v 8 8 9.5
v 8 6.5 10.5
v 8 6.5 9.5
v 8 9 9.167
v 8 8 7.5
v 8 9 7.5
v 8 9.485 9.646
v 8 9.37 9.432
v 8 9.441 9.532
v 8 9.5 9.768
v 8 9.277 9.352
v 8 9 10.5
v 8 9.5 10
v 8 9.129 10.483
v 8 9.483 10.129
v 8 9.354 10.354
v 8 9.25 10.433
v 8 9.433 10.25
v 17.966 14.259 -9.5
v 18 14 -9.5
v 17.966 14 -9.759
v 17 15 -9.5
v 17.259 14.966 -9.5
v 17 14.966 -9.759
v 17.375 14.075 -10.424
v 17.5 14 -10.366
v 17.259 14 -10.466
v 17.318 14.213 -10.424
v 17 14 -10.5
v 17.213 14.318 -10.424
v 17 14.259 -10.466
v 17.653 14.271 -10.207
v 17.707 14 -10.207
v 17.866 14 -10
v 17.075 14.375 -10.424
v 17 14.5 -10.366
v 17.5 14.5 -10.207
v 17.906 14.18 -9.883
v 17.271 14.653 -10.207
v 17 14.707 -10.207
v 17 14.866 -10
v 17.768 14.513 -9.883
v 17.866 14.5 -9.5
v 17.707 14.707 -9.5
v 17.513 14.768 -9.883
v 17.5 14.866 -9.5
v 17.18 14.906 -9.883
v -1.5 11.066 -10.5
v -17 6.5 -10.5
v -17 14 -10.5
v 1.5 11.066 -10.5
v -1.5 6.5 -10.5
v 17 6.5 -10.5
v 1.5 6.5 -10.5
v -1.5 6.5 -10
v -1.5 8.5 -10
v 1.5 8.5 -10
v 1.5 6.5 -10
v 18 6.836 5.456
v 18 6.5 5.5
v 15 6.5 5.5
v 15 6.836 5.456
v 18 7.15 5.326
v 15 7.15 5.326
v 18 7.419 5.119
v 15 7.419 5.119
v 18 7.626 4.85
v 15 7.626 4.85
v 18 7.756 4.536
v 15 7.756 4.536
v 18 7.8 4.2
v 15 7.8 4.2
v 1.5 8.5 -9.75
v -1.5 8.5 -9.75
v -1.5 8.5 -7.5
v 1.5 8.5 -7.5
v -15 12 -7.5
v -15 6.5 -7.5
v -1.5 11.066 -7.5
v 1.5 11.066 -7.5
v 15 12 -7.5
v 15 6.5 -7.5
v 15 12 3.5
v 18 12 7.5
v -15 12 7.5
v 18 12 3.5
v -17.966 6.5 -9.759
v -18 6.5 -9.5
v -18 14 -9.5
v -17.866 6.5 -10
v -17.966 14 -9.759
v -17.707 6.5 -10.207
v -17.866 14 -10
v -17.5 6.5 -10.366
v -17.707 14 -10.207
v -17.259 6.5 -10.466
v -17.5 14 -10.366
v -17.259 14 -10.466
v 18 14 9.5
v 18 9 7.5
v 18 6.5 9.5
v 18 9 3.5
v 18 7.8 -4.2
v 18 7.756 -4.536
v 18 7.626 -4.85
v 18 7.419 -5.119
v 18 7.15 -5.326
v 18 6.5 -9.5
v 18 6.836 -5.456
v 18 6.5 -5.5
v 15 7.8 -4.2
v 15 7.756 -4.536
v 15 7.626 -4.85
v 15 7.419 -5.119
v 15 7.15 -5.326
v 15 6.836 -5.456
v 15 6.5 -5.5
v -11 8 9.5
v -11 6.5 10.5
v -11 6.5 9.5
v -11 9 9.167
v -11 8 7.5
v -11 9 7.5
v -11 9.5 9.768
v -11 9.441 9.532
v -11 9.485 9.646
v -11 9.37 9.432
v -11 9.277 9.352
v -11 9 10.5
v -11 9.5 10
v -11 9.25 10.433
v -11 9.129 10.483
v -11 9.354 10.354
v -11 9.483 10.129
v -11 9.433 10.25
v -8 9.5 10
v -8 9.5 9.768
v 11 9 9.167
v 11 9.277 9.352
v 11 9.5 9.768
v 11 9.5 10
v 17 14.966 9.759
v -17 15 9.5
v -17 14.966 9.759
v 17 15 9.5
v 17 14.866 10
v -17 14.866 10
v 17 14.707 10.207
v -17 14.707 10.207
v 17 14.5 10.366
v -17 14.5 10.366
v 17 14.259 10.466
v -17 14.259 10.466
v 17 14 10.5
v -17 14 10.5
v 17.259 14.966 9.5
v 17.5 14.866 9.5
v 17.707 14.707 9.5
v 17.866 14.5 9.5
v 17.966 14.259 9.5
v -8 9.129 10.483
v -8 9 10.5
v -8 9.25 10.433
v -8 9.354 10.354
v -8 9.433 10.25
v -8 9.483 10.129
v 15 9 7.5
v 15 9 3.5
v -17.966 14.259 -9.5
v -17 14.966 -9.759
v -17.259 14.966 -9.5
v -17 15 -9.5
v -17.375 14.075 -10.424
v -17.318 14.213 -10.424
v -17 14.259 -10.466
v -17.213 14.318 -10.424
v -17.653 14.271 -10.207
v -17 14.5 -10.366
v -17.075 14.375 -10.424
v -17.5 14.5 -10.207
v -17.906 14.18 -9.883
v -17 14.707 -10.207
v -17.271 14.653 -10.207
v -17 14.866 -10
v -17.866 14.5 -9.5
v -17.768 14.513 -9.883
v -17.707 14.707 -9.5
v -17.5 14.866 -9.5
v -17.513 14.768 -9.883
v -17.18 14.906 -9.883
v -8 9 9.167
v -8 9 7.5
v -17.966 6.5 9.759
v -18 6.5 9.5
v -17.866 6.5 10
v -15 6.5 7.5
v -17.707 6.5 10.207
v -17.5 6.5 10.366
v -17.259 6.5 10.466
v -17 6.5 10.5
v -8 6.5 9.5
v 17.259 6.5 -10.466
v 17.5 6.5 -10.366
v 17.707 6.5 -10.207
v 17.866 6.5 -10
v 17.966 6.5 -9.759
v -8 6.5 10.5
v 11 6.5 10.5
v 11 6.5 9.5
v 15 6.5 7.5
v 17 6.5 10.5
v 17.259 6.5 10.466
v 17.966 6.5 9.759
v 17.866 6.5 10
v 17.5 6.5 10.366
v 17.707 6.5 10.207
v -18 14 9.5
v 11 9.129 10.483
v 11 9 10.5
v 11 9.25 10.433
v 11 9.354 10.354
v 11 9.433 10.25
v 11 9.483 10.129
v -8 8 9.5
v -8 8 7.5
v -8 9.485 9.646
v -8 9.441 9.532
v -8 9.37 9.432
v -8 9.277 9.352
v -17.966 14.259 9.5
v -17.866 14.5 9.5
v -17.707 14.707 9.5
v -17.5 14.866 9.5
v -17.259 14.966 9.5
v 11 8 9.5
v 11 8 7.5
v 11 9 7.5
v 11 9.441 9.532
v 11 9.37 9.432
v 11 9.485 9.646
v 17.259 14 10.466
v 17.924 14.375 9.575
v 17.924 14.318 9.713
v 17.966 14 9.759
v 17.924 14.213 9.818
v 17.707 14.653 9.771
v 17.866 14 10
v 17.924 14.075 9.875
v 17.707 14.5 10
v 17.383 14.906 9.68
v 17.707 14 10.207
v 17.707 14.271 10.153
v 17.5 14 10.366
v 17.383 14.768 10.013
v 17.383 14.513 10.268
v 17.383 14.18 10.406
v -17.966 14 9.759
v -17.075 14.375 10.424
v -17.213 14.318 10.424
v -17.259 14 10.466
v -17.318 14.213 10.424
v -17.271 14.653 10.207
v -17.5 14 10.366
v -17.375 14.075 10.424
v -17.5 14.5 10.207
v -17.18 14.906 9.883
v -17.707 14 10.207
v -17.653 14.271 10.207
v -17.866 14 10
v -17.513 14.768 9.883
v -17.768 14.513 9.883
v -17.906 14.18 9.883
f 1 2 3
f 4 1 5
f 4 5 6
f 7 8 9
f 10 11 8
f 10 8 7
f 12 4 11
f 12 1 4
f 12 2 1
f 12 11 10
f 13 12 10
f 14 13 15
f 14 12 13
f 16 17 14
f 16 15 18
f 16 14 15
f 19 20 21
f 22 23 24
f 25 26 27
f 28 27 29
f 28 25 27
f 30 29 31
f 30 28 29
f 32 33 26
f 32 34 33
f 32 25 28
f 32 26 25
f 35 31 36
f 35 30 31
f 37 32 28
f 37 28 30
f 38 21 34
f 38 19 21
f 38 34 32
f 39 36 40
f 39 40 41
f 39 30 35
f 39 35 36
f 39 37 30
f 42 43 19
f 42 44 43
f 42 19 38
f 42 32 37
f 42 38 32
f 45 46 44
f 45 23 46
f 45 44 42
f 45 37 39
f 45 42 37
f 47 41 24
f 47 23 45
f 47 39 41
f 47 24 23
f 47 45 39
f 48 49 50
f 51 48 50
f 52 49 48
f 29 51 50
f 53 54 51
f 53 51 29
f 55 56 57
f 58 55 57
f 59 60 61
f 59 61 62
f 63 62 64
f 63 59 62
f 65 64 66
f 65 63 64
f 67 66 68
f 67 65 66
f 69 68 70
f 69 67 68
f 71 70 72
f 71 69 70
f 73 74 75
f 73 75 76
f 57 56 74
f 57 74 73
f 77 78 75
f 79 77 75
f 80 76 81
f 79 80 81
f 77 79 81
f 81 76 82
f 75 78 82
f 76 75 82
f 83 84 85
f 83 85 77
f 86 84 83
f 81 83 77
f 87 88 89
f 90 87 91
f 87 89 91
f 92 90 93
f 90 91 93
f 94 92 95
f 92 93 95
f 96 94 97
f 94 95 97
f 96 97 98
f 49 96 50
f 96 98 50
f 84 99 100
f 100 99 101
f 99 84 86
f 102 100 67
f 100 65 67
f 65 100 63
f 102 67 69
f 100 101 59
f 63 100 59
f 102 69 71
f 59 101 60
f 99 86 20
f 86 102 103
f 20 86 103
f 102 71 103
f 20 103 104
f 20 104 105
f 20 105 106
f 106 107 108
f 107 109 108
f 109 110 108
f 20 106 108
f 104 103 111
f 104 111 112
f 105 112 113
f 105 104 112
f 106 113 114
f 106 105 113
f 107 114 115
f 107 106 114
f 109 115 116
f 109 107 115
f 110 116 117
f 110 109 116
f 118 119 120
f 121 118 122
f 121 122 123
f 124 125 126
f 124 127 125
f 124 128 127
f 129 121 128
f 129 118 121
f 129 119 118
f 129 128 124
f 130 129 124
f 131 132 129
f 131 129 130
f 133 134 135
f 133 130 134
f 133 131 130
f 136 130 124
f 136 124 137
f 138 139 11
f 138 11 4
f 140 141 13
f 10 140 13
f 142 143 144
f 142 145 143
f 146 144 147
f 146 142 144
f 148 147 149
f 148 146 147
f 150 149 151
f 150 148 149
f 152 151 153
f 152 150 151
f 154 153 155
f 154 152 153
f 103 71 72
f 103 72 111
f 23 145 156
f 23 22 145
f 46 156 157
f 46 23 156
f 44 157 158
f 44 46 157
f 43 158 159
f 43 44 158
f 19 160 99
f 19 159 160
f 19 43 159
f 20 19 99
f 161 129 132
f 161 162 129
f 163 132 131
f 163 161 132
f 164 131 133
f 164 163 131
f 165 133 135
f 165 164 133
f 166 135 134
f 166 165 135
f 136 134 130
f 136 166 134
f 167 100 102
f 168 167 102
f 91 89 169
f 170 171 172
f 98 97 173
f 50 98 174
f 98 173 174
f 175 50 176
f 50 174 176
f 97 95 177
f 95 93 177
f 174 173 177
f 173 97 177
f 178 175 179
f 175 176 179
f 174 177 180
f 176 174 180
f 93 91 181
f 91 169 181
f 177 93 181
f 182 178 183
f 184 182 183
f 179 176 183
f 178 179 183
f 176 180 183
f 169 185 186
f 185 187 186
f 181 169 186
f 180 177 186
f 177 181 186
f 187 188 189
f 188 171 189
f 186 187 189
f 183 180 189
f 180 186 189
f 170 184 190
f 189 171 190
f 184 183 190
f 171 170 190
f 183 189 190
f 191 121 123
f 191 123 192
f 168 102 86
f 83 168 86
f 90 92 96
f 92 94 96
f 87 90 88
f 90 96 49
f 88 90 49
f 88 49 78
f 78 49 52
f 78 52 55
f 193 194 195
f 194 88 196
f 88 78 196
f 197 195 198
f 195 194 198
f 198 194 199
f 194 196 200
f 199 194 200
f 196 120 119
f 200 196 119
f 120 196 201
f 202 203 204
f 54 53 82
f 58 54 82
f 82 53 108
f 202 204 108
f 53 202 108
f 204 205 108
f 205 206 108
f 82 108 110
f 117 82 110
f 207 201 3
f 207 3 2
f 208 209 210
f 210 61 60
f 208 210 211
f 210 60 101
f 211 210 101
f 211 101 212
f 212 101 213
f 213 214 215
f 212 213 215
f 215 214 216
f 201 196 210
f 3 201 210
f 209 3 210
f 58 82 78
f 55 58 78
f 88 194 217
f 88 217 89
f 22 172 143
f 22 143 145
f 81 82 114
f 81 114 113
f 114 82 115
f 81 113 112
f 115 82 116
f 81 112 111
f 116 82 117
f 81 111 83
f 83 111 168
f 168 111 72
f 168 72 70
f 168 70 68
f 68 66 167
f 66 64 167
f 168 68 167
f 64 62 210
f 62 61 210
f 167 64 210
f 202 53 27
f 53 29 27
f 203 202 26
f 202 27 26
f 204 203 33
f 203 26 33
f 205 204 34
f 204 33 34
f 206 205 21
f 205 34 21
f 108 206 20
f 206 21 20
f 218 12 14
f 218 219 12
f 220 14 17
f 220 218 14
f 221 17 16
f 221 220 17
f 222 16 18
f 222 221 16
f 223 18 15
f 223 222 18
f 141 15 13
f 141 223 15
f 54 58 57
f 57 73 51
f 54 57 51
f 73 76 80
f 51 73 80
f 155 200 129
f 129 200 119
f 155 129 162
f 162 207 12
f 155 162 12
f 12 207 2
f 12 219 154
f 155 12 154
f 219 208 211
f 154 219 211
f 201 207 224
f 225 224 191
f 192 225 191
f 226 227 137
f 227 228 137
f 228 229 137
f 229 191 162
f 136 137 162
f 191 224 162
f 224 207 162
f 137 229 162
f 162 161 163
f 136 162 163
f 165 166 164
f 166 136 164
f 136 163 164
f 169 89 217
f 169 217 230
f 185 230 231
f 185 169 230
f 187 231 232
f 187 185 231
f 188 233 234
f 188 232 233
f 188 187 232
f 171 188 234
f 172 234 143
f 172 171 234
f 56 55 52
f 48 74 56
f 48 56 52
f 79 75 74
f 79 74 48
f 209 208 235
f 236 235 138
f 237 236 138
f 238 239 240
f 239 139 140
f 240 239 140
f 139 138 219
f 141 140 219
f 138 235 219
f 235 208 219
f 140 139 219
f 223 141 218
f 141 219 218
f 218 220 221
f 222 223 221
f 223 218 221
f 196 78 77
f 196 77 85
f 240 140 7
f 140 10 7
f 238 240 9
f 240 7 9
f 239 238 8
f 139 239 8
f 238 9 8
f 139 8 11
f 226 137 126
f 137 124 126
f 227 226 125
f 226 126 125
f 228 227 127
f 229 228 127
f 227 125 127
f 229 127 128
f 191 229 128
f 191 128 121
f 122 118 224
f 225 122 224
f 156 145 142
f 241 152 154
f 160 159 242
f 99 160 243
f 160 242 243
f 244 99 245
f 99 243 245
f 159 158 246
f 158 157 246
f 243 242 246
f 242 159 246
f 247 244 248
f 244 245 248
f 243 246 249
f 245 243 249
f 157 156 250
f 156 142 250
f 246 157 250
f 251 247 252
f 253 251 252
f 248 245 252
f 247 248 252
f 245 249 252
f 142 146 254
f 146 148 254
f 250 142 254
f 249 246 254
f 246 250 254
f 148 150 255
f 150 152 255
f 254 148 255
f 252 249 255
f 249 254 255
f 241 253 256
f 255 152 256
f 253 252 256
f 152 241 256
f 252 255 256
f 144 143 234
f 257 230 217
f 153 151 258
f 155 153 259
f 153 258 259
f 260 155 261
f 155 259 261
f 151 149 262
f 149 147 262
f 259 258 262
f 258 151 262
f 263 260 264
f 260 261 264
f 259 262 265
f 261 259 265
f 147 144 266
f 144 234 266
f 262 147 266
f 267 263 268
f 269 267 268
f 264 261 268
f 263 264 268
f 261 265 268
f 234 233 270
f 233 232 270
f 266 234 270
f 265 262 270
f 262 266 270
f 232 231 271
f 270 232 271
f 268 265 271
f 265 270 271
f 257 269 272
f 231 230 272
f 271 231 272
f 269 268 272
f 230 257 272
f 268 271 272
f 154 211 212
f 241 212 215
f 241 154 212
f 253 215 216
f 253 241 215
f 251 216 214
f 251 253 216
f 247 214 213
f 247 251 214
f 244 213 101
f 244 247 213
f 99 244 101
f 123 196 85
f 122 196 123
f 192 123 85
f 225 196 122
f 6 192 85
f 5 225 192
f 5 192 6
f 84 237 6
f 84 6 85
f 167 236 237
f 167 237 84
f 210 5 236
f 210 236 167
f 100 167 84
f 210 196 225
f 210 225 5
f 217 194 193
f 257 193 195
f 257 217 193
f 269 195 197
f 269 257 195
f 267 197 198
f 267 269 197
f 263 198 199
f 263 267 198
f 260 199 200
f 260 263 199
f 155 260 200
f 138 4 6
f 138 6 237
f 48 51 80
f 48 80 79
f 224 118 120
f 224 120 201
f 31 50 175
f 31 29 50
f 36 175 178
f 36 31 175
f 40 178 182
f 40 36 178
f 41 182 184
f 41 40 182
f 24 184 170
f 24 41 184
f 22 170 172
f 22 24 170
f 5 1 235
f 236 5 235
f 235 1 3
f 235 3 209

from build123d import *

# Parameters (mm, degrees)
SKETCH1_W           = 36
SKETCH1_H           = 21
BOSS_EXTRUDE2_DEPTH = 15
CUT_EXTRUDE1_DEPTH  = 15
SKETCH5_W           = 30
SKETCH5_H           = 15
CUT_EXTRUDE2_DEPTH  = 3.5
SKETCH7_W           = 30
SKETCH7_H           = 15
CUT_EXTRUDE3_DEPTH  = 5.5
FILLET1_R           = 1
FILLET2_R           = 1
SKETCH9_W           = 3
SKETCH9_H           = 3
BOSS_EXTRUDE3_DEPTH = 1
SKETCH9_4_W         = 3
SKETCH9_4_H         = 3
BOSS_EXTRUDE4_DEPTH = 1
SKETCH10_W          = 3
SKETCH10_H          = 1.5
BOSS_EXTRUDE5_DEPTH = 1
CUT_EXTRUDE4_DEPTH  = 35.296501279
SKETCH12_W          = 3
SKETCH12_H          = 6
BOSS_EXTRUDE6_DEPTH = 0.5
FILLET3_R           = 11
FILLET4_R           = 0.5
SKETCH17_W          = 3
SKETCH17_H          = 2
BOSS_EXTRUDE7_DEPTH = 1
SKETCH18_W          = 3
SKETCH18_H          = 1.5
BOSS_EXTRUDE8_DEPTH = 1
FILLET5_R           = 0.75
FILLET6_START       = -1.5
FILLET6_DEPTH       = 3
SKETCH19_W          = 3
SKETCH19_H          = 1
CUT_EXTRUDE5_DEPTH  = 8
SKETCH20_W          = 3
SKETCH20_H          = 2.565888667
CUT_EXTRUDE6_DEPTH  = 8
SKETCH21_W          = 4
SKETCH21_H          = 3
CUT_EXTRUDE7_DEPTH  = 8


with BuildPart() as part:
    # Sketch1 → Boss-Extrude2 (new body)
    with BuildSketch(Plane(origin=(0, 0, 0), x_dir=(1, 0, 0), z_dir=(0, 1, 0))):
        Rectangle(SKETCH1_W, SKETCH1_H)
    extrude(amount=BOSS_EXTRUDE2_DEPTH)

    # Sketch2 → Cut-Extrude1 (cut)
    with BuildSketch(Plane(origin=(18, 0, 0), x_dir=(0, 0, -1), z_dir=(1, 0, 0))):
        with BuildLine():
            Line((-4.2, 7.8), (4.2, 7.8))
            ThreePointArc((4.2, 7.8), (5.5, 6.5), (4.2, 5.2))
            Line((4.2, 5.2), (-4.2, 5.2))
            ThreePointArc((-4.2, 5.2), (-5.5, 6.5), (-4.2, 7.8))
        make_face()
    extrude(amount=-CUT_EXTRUDE1_DEPTH, mode=Mode.SUBTRACT)


with BuildPart() as body_2:
    # Split1: the piece on the far side of the plane
    add(part.part)
    split(bisect_by=Plane.ZX.offset(6.5), keep=Keep.BOTTOM)

    # Sketch5 → Cut-Extrude2 (cut)
    with BuildSketch(Plane(origin=(0, 6.5, 0), x_dir=(1, 0, 0), z_dir=(0, 1, 0))):
        Rectangle(SKETCH5_W, SKETCH5_H)
    extrude(amount=-CUT_EXTRUDE2_DEPTH, mode=Mode.SUBTRACT)

    # Fillet2
    fillet2_edges = [body_2.edges().sort_by_distance(p)[0] for p in [
        (18, 0, 0),
        (0, 0, -10.5),
        (-18, 0, 0),
        (0, 0, 10.5),
        (18, 3.25, 10.5),
        (-18, 3.25, 10.5),
        (-18, 3.25, -10.5),
        (18, 3.25, -10.5),
    ]]
    fillet(fillet2_edges, radius=FILLET2_R)

    # Sketch9 → Boss-Extrude3 (add)
    with BuildSketch(Plane.XY.offset(10.5)):
        with Locations((-9.5, 8)):
            Rectangle(SKETCH9_W, SKETCH9_H)
    extrude(amount=-BOSS_EXTRUDE3_DEPTH)

    # Sketch9<4> → Boss-Extrude4 (add)
    with BuildSketch(Plane.XY.offset(10.5)):
        with Locations((9.5, 8)):
            Rectangle(SKETCH9_4_W, SKETCH9_4_H)
    extrude(amount=-BOSS_EXTRUDE4_DEPTH)

    # Sketch10 → Boss-Extrude5 (add)
    with BuildSketch(Plane(origin=(0, 0, 9.5), x_dir=(-1, 0, 0), z_dir=(0, 0, -1))):
        with Locations((-9.5, 8.75)):
            Rectangle(SKETCH10_W, SKETCH10_H)
        with Locations((9.5, 8.75)):
            Rectangle(SKETCH10_W, SKETCH10_H)
    extrude(amount=BOSS_EXTRUDE5_DEPTH)

    # Sketch11 → Cut-Extrude4 (cut, through all)
    with BuildSketch(Plane(origin=(11, 0, 0), x_dir=(0, 0, -1), z_dir=(1, 0, 0))):
        Polygon((-9.5, 9.5), (-8.5, 8), (-8.5, 9.5), align=None)
    extrude(amount=-CUT_EXTRUDE4_DEPTH, mode=Mode.SUBTRACT)

    # Sketch12 → Boss-Extrude6 (add, symmetric)
    with BuildSketch(Plane(origin=(0, 0, -10.5), x_dir=(-1, 0, 0), z_dir=(0, 0, -1))):
        with Locations((0, 6.5)):
            Rectangle(SKETCH12_W, SKETCH12_H)
    extrude(amount=BOSS_EXTRUDE6_DEPTH, both=True)

    # Fillet3
    # the kernel refuses this fillet: 11 mm, written as the material it takes off along each edge
    with BuildSketch(Plane(origin=(-9.696798155, 3.5, -11), x_dir=(0, 0, 1), z_dir=(1, 0, 0))) as fillet3_piece_1:
        with BuildLine():
            CenterArc((11, -3.278719262), FILLET3_R, 162.658557197, 17.341442803)
            Line((0, -3.278719262), (-0.22, -3.278719262))
            Line((-0.22, -3.278719262), (-0.22, 0))
            Line((-0.22, 0), (0, 0.22))
            ThreePointArc((0, 0.22), (0.25, 0.22), (0.29, 0.065574385))
            Line((0.29, 0.065574385), (0.5, 0))
        make_face()
    extrude(amount=19.393596311, mode=Mode.SUBTRACT)

    # Fillet4
    fillet4_edges = [body_2.edges().sort_by_distance(p)[0] for p in [
        (-9.5, 9.5, 9.5),
        (9.5, 9.5, 9.5),
        (-9.5, 9.5, 10.5),
        (9.5, 9.5, 10.5),
    ]]
    fillet(fillet4_edges, radius=FILLET4_R)

    # Sketch17 → Boss-Extrude7 (add)
    with BuildSketch(Plane.XY.offset(-10)):
        with Locations((0, 10.5)):
            Rectangle(SKETCH17_W, SKETCH17_H)
    extrude(amount=-BOSS_EXTRUDE7_DEPTH)

    # Sketch18 → Boss-Extrude8 (add)
    with BuildSketch(Plane.XY.offset(-10)):
        with Locations((0, 9.25)):
            Rectangle(SKETCH18_W, SKETCH18_H)
    extrude(amount=BOSS_EXTRUDE8_DEPTH)

    # Fillet5
    fillet5_edges = [body_2.edges().sort_by_distance(p)[0] for p in [
        (0, 8.5, -9),
        (0, 10, -9),
    ]]
    fillet(fillet5_edges, radius=FILLET5_R - 0.0001)  # a hair under: the kernel refuses the full size

    # Fillet6: read off the stored shape, not the designer's step
    # Fillet6 outline → Fillet6 (cut)
    with BuildSketch(Plane.YZ.offset(FILLET6_START)):
        with BuildLine():
            add(Edge.make_bspline(
                [(11.5, -11), (11.5, -10), (10.5, -10)],
                knots=[0, 0, 0, 1, 1, 1], degree=2, weights=[1, 0.070710678, 1]))
            Line((11.5, -11), (11.5, -10))
            Line((11.5, -10), (10.5, -10))
        make_face()
    extrude(amount=FILLET6_DEPTH, mode=Mode.SUBTRACT)


with BuildPart() as part_1:
    add(part.part)

    # Split1
    split(bisect_by=Plane.ZX.offset(6.5), keep=Keep.TOP)

    # Sketch7 → Cut-Extrude3 (cut)
    with BuildSketch(Plane.XZ.offset(-6.5)):
        Rectangle(SKETCH7_W, SKETCH7_H)
    extrude(amount=-CUT_EXTRUDE3_DEPTH, mode=Mode.SUBTRACT)

    # Fillet1
    fillet1_edges = [part_1.edges().sort_by_distance(p)[0] for p in [
        (-18, 15, 0),
        (0, 15, 10.5),
        (18, 15, 0),
        (18, 10.75, 10.5),
        (-18, 10.75, 10.5),
        (-18, 10.75, -10.5),
        (18, 10.75, -10.5),
        (0, 15, -10.5),
    ]]
    fillet(fillet1_edges, radius=FILLET1_R)

    # Combine1: cut body 2
    add(body_2.part, mode=Mode.SUBTRACT)

    # Sketch19 → Cut-Extrude5 (cut)
    with BuildSketch(Plane.XY.offset(10.5)):
        with Locations((9.5, 8.5)):
            Rectangle(SKETCH19_W, SKETCH19_H)
        with Locations((-9.5, 8.5)):
            Rectangle(SKETCH19_W, SKETCH19_H)
    extrude(amount=-CUT_EXTRUDE5_DEPTH, mode=Mode.SUBTRACT)

    # Sketch20 → Cut-Extrude6 (cut)
    with BuildSketch(Plane(origin=(0, 0, -10.5), x_dir=(-1, 0, 0), z_dir=(0, 0, -1))):
        with Locations((0, 9.782944334)):
            Rectangle(SKETCH20_W, SKETCH20_H)
    extrude(amount=-CUT_EXTRUDE6_DEPTH, mode=Mode.SUBTRACT)

    # Sketch21 → Cut-Extrude7 (cut)
    with BuildSketch(Plane(origin=(18, 0, 0), x_dir=(0, 0, -1), z_dir=(1, 0, 0))):
        with Locations((-5.5, 10.5)):
            Rectangle(SKETCH21_W, SKETCH21_H)
    extrude(amount=-CUT_EXTRUDE7_DEPTH, mode=Mode.SUBTRACT)


solid = part_1.part
